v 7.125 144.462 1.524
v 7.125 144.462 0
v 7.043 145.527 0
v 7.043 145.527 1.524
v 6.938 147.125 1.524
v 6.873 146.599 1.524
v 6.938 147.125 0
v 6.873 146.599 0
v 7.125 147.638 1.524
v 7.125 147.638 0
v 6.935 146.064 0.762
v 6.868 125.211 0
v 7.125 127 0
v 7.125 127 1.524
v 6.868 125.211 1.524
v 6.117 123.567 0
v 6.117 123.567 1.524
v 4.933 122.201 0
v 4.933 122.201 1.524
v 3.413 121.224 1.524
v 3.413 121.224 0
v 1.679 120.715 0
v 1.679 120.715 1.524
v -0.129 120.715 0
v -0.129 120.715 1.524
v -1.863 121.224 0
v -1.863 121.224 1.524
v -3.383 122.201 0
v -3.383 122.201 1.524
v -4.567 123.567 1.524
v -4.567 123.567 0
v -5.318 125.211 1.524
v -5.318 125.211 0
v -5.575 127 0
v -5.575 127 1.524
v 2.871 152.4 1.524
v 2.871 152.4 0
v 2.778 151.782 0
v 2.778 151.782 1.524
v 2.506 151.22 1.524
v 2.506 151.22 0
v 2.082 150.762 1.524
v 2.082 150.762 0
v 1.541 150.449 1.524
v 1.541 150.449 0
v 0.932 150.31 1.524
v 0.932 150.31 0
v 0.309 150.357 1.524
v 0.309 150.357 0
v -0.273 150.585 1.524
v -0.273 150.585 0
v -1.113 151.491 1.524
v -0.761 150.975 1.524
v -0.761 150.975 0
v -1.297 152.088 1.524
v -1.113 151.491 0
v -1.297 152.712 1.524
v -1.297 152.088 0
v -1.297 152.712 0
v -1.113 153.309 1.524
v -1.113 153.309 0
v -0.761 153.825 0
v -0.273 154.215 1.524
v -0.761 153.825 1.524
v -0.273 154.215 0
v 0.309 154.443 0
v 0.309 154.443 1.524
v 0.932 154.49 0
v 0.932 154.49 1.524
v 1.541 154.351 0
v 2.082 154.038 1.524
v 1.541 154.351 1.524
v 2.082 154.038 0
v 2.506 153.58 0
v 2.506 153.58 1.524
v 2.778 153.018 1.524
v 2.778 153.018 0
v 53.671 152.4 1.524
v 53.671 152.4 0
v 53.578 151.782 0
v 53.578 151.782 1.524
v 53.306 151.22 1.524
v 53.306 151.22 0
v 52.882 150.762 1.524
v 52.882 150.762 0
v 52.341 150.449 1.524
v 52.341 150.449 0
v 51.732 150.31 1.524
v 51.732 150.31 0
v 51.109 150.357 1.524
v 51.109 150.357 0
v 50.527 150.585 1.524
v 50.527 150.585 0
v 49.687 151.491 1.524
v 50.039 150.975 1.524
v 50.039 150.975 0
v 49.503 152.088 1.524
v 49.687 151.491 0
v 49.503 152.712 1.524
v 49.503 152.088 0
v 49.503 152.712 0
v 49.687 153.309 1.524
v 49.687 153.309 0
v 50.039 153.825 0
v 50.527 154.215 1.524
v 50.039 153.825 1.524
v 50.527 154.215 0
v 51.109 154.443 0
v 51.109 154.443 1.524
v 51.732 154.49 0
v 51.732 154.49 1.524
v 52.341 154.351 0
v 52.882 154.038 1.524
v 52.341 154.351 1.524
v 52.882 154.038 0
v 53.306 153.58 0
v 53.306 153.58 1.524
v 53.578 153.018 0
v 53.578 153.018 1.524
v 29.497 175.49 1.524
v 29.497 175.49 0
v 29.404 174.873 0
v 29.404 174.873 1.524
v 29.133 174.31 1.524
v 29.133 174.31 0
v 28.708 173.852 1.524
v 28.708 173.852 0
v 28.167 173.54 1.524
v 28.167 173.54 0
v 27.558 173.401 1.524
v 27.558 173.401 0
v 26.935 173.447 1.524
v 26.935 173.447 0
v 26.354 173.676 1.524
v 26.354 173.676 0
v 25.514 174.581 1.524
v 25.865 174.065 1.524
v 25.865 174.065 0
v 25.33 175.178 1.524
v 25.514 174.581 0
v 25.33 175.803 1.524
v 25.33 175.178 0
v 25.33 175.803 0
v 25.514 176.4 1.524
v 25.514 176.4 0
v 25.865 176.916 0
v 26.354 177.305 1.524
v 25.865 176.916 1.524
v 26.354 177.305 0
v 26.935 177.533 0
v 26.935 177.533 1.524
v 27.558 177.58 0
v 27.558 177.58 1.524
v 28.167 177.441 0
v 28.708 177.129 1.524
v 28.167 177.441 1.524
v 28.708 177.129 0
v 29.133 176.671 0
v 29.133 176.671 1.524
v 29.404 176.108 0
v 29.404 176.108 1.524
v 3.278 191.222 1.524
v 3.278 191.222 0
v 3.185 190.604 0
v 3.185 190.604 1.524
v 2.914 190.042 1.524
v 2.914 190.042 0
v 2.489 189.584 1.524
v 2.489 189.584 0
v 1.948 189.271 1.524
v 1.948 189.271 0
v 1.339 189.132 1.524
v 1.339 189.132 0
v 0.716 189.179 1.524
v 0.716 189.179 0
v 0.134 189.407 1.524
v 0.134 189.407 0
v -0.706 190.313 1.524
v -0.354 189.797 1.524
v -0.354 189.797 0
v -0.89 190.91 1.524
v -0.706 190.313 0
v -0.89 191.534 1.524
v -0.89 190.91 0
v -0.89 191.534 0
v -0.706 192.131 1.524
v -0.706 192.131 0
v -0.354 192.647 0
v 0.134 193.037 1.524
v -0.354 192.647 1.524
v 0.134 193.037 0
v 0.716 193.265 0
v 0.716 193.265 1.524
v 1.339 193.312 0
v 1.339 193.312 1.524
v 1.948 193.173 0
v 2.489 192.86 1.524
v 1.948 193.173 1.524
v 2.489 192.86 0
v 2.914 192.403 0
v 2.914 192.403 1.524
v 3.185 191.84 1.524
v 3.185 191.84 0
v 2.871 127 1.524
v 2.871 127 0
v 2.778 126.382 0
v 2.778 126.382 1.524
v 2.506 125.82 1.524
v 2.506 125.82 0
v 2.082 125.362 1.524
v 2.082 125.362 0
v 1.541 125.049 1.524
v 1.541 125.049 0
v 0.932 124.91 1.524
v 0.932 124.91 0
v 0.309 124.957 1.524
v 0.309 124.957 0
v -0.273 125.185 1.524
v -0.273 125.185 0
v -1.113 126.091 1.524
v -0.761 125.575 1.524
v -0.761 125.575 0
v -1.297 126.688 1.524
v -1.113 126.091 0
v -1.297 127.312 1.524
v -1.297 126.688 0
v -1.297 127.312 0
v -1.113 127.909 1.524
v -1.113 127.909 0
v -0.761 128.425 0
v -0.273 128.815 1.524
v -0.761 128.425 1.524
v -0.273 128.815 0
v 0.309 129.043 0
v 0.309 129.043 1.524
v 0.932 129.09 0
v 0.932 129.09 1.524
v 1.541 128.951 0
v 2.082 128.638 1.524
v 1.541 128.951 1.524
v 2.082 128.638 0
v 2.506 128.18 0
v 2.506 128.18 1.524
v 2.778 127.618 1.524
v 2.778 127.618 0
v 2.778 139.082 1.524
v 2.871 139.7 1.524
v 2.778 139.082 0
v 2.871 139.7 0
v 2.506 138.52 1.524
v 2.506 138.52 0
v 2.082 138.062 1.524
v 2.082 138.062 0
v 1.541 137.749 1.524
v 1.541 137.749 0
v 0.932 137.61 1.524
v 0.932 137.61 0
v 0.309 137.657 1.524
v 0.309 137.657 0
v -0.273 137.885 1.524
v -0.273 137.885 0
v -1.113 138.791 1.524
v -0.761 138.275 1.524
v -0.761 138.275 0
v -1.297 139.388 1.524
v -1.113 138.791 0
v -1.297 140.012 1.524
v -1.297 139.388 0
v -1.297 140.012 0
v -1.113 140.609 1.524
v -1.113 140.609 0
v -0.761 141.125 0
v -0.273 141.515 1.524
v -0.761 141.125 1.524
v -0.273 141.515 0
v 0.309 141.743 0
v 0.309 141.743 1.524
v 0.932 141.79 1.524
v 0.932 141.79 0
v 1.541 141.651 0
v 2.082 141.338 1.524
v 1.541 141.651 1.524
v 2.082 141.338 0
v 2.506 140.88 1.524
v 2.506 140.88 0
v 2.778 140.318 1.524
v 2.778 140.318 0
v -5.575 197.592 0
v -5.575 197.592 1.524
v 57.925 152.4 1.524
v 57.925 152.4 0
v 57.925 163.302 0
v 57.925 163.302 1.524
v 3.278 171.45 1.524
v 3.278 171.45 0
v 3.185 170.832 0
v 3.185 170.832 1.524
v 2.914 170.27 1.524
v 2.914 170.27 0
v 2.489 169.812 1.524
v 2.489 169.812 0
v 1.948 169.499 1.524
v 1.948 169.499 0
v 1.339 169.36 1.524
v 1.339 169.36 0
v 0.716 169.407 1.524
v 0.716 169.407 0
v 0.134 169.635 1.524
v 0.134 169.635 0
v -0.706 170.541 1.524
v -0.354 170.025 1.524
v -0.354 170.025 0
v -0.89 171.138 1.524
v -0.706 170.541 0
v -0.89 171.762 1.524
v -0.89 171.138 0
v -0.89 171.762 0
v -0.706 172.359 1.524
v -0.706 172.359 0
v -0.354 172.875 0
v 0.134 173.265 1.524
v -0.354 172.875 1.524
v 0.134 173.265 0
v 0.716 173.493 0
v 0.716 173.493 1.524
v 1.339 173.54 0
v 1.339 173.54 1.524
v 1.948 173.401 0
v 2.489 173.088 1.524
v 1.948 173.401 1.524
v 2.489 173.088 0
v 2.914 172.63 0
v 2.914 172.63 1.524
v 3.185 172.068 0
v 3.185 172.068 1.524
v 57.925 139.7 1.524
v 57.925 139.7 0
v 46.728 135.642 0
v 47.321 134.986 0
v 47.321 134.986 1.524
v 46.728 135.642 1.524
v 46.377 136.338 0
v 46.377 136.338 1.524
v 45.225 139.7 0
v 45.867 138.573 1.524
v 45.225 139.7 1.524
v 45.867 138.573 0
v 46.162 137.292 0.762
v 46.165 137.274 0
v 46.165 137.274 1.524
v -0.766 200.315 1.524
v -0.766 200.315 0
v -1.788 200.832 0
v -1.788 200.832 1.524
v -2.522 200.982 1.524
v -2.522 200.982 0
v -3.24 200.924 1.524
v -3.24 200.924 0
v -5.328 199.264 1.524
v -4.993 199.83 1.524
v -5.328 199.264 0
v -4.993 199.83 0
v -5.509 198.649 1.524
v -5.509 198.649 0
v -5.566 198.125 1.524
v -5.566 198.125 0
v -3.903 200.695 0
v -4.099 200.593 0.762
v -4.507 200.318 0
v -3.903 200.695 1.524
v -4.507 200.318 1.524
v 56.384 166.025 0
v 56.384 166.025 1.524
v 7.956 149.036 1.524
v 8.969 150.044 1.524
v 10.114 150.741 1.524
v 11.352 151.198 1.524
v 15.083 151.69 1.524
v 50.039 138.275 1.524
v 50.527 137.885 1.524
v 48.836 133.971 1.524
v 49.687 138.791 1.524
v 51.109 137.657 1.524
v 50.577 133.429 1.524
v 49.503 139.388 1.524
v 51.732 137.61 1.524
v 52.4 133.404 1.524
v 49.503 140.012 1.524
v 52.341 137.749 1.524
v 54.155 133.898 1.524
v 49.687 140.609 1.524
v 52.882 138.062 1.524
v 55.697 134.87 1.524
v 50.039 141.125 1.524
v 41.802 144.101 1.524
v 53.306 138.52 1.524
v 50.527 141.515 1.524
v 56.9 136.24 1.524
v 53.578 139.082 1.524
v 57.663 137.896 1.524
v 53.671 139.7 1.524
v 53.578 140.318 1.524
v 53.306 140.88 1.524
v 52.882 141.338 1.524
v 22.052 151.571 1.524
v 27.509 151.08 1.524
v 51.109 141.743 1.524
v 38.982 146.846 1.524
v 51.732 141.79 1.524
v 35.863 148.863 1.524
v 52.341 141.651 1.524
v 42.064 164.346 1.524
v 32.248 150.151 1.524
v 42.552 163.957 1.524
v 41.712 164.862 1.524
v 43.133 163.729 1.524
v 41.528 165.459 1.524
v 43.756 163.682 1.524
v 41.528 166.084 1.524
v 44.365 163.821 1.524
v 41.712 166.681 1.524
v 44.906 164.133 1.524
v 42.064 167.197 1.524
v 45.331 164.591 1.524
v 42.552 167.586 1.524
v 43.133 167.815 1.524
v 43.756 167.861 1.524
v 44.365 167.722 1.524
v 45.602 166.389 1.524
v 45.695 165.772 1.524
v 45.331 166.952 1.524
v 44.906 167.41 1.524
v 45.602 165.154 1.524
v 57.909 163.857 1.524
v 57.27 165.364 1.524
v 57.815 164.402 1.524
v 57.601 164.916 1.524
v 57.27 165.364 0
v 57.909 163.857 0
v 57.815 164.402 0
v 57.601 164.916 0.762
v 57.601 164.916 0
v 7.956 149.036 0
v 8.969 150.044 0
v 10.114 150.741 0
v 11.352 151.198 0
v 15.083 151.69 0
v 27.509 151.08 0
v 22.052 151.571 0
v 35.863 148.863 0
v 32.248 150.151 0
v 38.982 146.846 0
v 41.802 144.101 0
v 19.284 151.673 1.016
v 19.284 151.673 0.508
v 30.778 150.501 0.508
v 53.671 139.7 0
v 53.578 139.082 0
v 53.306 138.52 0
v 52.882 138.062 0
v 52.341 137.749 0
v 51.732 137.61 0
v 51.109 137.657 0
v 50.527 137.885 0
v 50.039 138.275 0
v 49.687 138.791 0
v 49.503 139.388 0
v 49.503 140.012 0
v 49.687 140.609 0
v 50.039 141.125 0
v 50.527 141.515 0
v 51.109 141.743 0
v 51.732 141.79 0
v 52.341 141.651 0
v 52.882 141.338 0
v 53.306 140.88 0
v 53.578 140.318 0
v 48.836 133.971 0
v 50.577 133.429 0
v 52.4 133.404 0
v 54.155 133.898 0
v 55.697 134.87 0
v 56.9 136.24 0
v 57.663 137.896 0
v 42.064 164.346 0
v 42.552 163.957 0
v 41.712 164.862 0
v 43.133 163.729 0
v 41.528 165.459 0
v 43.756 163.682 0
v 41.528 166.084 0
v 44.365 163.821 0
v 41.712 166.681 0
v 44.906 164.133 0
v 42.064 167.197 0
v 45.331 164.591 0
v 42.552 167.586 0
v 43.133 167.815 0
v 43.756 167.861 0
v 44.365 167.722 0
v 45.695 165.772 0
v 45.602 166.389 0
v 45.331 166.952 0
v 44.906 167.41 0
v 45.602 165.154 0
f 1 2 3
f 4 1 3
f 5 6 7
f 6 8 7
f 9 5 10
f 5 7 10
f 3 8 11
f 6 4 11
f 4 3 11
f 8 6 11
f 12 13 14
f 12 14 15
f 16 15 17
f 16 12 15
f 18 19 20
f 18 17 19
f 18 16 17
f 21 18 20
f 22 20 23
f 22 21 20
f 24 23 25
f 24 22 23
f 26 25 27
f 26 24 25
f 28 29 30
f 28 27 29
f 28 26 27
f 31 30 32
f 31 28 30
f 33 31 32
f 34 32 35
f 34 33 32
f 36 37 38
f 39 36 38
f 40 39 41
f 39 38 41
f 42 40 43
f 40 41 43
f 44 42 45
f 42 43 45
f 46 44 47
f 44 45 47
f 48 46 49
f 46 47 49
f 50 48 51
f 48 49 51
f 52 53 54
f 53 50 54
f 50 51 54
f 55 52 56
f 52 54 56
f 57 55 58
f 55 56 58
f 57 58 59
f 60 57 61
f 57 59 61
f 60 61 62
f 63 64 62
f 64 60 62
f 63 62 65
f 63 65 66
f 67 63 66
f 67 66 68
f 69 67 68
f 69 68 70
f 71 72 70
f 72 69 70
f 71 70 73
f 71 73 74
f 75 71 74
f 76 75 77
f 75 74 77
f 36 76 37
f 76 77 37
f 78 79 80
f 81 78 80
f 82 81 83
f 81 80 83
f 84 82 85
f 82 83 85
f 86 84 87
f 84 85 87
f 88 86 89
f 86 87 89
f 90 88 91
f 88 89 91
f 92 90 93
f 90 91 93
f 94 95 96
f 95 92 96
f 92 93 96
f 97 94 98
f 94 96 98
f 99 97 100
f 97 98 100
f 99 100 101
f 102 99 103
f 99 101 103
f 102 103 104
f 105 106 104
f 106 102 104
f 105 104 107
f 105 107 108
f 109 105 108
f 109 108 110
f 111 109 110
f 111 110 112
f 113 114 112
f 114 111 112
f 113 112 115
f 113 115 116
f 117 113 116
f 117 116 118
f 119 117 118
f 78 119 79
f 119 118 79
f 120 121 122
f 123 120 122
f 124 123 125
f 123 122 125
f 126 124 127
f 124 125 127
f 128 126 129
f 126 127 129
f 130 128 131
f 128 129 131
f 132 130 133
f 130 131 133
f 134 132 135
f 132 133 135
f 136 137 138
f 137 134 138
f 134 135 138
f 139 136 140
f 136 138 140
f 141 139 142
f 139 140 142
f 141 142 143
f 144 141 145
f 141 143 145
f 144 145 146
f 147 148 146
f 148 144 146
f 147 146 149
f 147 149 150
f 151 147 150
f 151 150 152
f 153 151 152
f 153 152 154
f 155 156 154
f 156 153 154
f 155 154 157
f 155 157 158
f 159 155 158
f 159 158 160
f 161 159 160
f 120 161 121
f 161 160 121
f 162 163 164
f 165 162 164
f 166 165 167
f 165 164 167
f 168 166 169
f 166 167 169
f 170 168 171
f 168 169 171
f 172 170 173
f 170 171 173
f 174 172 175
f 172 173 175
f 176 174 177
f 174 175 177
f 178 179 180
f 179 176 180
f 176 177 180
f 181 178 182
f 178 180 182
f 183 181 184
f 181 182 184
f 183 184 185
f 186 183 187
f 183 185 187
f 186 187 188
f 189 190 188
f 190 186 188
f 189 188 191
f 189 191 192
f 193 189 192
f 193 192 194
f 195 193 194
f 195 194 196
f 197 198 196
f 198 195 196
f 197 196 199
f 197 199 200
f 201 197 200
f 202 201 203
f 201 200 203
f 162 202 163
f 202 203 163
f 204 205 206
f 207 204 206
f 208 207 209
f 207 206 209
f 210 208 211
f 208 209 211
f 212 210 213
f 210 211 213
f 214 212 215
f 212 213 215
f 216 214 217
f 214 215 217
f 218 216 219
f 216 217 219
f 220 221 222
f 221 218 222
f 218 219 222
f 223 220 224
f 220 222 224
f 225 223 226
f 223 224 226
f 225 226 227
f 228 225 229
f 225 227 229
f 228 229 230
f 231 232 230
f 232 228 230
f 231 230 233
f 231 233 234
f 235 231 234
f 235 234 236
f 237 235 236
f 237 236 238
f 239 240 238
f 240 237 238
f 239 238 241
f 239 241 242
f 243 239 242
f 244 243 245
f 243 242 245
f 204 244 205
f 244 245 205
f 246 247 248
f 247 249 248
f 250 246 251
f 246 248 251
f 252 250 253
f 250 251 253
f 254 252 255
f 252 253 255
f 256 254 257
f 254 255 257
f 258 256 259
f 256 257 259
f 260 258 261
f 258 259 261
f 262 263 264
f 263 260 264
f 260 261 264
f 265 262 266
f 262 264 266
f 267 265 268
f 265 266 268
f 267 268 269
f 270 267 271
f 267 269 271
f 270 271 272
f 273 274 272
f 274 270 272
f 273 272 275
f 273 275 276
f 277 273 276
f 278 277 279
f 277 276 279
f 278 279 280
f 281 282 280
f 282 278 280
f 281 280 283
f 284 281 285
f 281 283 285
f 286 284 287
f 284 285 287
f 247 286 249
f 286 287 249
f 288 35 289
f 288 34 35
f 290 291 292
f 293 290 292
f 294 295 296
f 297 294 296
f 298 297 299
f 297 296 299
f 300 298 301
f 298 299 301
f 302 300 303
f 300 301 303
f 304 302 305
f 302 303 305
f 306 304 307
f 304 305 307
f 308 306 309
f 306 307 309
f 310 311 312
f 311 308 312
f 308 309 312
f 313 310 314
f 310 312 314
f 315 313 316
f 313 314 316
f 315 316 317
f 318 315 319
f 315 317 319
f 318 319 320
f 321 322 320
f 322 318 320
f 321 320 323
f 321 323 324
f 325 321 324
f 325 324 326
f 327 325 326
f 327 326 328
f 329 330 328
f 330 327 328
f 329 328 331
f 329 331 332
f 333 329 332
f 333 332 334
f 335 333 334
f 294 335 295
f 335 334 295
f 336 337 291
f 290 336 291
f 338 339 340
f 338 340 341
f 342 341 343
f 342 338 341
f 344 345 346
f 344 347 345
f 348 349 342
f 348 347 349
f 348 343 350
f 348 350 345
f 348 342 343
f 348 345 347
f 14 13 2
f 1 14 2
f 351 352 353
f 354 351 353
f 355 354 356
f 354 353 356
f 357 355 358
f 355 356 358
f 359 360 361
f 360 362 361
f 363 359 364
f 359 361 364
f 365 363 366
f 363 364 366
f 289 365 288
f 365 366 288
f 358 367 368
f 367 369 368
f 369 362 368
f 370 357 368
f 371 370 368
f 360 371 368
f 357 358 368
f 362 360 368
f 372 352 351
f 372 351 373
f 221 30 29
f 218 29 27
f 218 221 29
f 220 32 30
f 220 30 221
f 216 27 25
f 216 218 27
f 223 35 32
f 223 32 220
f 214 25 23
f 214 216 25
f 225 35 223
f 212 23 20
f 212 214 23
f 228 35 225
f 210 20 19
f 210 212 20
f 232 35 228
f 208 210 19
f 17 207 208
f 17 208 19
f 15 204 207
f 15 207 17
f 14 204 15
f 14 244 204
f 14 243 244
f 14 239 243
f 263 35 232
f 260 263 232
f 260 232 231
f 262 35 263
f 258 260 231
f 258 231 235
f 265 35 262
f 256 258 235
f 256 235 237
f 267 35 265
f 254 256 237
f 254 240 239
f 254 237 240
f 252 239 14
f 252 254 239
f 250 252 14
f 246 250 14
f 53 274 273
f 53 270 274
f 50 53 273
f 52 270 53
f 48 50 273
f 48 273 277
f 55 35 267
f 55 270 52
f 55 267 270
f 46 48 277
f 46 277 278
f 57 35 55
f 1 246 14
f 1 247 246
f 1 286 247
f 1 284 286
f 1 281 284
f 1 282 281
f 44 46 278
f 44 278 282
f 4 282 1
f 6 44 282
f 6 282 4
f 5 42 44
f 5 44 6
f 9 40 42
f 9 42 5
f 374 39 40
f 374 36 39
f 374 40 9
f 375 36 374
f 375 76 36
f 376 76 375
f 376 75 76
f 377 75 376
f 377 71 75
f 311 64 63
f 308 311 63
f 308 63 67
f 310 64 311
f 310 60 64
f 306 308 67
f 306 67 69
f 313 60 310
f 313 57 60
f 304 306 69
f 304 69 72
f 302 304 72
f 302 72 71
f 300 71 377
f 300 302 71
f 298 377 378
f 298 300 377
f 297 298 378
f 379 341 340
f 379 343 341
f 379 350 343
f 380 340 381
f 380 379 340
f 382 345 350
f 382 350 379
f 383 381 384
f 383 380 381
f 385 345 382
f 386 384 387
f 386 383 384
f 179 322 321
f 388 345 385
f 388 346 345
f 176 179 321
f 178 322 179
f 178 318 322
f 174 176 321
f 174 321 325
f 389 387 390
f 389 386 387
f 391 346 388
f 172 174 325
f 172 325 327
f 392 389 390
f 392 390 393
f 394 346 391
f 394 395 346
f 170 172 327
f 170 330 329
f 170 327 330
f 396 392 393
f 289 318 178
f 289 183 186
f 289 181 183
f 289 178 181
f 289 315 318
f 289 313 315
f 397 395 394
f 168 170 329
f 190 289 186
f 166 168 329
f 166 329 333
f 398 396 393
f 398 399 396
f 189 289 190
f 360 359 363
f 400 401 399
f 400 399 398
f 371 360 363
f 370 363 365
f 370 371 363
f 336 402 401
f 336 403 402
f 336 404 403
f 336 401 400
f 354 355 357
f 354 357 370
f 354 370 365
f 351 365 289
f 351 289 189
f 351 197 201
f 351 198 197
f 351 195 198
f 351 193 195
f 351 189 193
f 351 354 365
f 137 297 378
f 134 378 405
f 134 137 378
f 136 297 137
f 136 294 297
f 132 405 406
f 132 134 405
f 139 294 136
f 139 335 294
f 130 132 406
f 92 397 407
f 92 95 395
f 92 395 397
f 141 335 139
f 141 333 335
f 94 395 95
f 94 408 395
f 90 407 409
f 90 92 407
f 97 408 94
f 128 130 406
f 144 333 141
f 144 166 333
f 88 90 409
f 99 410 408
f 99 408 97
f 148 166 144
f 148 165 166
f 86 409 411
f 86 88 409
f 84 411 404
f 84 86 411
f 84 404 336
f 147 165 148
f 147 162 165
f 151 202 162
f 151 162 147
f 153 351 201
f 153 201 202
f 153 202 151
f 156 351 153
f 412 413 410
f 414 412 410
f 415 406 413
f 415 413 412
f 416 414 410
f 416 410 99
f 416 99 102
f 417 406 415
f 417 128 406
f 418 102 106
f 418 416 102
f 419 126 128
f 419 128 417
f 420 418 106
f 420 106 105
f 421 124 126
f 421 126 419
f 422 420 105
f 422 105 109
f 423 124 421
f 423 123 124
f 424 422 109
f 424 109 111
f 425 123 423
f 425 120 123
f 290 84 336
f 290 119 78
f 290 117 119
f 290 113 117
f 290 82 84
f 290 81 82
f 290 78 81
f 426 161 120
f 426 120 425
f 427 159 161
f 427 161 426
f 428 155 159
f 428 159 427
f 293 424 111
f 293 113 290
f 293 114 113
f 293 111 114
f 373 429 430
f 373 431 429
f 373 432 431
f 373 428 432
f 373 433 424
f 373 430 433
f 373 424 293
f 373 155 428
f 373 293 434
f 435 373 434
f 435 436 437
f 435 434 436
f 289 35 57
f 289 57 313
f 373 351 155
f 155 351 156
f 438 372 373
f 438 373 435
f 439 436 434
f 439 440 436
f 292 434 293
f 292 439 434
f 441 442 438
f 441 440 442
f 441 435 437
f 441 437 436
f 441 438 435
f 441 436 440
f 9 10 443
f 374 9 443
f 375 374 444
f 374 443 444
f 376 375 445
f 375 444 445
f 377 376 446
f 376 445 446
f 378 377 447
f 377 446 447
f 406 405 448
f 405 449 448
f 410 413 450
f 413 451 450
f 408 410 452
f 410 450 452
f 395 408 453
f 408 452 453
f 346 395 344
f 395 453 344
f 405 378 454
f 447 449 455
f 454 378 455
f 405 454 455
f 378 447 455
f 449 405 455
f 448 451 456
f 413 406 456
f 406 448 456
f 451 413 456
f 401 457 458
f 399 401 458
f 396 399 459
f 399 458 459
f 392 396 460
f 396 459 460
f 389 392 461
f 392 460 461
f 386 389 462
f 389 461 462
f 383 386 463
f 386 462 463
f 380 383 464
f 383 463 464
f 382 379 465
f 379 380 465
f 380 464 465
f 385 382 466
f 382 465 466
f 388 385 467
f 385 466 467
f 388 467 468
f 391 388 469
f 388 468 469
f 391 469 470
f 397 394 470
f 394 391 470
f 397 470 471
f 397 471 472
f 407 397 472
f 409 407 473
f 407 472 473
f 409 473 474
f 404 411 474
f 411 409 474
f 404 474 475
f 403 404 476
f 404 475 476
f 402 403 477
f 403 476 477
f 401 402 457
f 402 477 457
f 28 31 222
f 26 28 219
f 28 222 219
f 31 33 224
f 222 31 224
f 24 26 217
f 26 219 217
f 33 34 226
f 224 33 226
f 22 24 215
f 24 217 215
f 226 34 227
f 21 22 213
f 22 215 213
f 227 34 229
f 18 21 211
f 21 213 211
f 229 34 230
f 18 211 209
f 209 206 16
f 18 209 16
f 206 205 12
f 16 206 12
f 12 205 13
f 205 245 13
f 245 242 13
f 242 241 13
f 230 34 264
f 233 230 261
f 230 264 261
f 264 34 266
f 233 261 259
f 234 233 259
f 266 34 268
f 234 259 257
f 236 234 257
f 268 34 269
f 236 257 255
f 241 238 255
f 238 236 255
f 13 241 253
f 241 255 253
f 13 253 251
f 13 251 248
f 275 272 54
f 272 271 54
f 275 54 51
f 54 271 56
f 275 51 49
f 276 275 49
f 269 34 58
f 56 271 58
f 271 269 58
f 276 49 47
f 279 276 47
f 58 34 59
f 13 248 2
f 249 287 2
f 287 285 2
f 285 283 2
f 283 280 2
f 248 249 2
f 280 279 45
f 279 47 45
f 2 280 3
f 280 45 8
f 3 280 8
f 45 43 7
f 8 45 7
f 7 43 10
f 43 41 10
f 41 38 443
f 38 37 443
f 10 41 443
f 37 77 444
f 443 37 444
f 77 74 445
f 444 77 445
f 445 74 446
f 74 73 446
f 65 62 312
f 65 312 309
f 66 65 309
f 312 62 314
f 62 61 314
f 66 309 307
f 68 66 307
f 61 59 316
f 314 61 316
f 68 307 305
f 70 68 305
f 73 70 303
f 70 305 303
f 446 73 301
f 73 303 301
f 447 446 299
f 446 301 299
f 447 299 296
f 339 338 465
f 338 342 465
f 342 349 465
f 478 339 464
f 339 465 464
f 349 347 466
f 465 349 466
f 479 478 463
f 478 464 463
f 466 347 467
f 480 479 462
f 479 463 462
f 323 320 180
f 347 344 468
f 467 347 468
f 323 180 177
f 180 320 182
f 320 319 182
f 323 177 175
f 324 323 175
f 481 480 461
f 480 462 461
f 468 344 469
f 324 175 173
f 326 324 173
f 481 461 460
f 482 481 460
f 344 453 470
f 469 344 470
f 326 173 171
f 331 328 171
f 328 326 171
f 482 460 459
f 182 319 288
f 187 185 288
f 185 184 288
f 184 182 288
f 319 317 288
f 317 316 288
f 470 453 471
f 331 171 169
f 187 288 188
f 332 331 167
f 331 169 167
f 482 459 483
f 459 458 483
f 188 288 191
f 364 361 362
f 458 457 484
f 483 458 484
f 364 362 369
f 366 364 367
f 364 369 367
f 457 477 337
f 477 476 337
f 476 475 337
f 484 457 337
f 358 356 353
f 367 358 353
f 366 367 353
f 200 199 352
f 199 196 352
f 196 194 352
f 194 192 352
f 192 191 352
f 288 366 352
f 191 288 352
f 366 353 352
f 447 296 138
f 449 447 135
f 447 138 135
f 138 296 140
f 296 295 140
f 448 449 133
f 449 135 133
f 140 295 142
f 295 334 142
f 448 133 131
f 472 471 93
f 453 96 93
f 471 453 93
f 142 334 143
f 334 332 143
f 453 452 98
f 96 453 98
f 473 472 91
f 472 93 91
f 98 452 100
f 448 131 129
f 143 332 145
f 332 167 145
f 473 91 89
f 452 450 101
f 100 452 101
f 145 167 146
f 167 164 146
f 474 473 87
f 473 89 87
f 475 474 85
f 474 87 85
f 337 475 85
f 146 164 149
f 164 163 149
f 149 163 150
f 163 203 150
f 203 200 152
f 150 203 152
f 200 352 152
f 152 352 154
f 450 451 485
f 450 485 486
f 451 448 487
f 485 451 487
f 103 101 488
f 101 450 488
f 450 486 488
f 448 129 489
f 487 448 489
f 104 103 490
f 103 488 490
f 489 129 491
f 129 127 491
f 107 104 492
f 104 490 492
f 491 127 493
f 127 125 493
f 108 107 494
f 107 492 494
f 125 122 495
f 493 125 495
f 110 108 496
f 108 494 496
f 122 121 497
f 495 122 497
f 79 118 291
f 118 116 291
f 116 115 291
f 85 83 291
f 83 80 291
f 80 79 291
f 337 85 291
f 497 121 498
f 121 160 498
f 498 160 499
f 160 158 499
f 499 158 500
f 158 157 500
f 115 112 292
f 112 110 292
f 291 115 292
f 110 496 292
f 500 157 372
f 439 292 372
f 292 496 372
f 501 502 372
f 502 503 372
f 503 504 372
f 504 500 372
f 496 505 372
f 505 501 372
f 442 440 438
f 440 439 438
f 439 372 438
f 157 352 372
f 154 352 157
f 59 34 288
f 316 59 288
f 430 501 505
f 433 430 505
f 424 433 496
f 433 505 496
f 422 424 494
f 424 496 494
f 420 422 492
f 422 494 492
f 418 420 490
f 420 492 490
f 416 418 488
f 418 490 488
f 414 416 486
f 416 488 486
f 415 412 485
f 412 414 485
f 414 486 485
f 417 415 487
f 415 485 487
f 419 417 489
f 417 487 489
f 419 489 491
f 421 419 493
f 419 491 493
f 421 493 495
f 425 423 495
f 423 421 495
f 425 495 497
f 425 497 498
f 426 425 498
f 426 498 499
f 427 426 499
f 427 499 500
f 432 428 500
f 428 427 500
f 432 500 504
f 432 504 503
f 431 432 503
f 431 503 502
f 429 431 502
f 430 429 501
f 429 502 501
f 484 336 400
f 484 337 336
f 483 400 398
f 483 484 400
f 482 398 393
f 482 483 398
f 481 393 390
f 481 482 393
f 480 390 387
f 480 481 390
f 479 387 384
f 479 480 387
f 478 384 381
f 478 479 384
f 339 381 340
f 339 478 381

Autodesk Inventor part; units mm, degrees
ref_plane "YZ Plane" through (0, 0, 0) normal (1, 0, 0) x (0, 1, 0)
ref_plane "XZ Plane" through (0, 0, 0) normal (0, 1, 0) x (-1, 0, 0)
ref_plane "XY Plane" through (0, 0, 0) normal (0, 0, 1) x (1, 0, 0)
sketch "Sketch1" plane through (0, 0, 0) normal (0, 0, 1) x (1, 0, 0)
  circle A0 centre (0.7751, 127) radius 2.0955
  circle A1 centre (0.7751, 139.7) radius 2.0955
  circle A2 centre (0.7751, 152.4) radius 2.0955
  circle A3 centre (51.5751, 152.4) radius 2.0955
  circle A4 centre (51.5751, 139.7) radius 2.0955
  line L0 (57.9251, 139.7) -> (57.9251, 152.4)
  line L1 (-5.5749, 127) -> (-5.5749, 197.5923)
  line L2 (57.9251, 152.4) -> (57.9251, 163.3023)
  line L3 (-0.7663, 200.3149) -> (56.3837, 166.0249)
  spline S0 degree 4 poles (56.3837, 166.0249) (56.7408, 165.8106) (57.455, 165.3821) (57.9251, 164.5517) (57.9251, 163.7188) (57.9251, 163.3023) knots 0 0 0 0 0 0.5 1 1 1 1 1
  spline S1 degree 4 poles (-0.7663, 200.3149) (-1.5089, 200.7604) (-2.9939, 201.6514) (-5.5749, 200.1901) (-5.5749, 198.4583) (-5.5749, 197.5923) knots 0 0 0 0 0 0.5 1 1 1 1 1
  line L4 (7.1251, 147.6375) -> (8.9582, 151.7525) construction
  line L5 (8.9582, 151.7525) -> (16.6389, 151.7525) construction
  line L6 (16.6389, 151.7525) -> (25.4, 151.7525) construction
  line L7 (25.4, 151.7525) -> (33.3375, 150.3172) construction
  line L8 (33.3375, 150.3172) -> (39.6875, 147.6375) construction
  line L9 (39.6875, 147.6375) -> (45.2251, 139.7) construction
  spline S2 degree 4 poles (7.1251, 147.6375) (8.9582, 151.7525) (16.6389, 151.7525) (25.4, 151.7525) (33.3375, 150.3172) (39.6875, 147.6375) (45.2251, 139.7) knots 1 1 1 1 1 2 3 4 4 4 4 4
  arc A5 (-5.5749, 127) -> (7.1251, 127) centre (0.7751, 127) ccw
  line L10 (7.1251, 127) -> (7.1251, 144.4625)
  spline S3 degree 4 poles (7.1251, 144.4625) (7.1251, 144.8594) (7.1251, 145.6531) (6.6738, 146.4787) (6.9567, 147.2593) (7.1251, 147.6375) knots 0 0 0 0 0 0.5 1 1 1 1 1
  arc A6 (47.3211, 134.9856) -> (57.9251, 139.7) centre (51.5751, 139.7) ccw
  spline S4 degree 4 poles (47.3211, 134.9856) (46.8217, 135.4363) (45.9501, 136.4787) (46.3422, 138.0988) (45.5975, 139.1663) (45.2251, 139.7) knots 0 0 0 0 0 0.5 1 1 1 1 1
  circle A7 centre (1.1822, 191.2221) radius 2.0955
  circle A8 centre (27.4016, 175.4904) radius 2.0955
  circle A9 centre (43.5997, 165.7716) radius 2.0955
  circle A10 centre (1.1822, 171.45) radius 2.0955
  point P0 (0, 0)
  point P1 (-5.5749, 203.2)
  point P2 (57.9251, 165.1)
  dimension "d7" = 50.8
  dimension "d8" = 12.7
  dimension "d10" = 6.35
  dimension "d13" = 4.191
  dimension "d14" = 4.191
  dimension "d15" = 4.191
  dimension "d16" = 4.191
  dimension "d17" = 4.191
  dimension "d18" = 4.191
  dimension "d19" = 4.191
  dimension "d20" = 4.191
  dimension "d21" = 4.191
extrude "Extrusion1" add sketch "Sketch1" along normal blind 1.524
properties part number "funnel"
